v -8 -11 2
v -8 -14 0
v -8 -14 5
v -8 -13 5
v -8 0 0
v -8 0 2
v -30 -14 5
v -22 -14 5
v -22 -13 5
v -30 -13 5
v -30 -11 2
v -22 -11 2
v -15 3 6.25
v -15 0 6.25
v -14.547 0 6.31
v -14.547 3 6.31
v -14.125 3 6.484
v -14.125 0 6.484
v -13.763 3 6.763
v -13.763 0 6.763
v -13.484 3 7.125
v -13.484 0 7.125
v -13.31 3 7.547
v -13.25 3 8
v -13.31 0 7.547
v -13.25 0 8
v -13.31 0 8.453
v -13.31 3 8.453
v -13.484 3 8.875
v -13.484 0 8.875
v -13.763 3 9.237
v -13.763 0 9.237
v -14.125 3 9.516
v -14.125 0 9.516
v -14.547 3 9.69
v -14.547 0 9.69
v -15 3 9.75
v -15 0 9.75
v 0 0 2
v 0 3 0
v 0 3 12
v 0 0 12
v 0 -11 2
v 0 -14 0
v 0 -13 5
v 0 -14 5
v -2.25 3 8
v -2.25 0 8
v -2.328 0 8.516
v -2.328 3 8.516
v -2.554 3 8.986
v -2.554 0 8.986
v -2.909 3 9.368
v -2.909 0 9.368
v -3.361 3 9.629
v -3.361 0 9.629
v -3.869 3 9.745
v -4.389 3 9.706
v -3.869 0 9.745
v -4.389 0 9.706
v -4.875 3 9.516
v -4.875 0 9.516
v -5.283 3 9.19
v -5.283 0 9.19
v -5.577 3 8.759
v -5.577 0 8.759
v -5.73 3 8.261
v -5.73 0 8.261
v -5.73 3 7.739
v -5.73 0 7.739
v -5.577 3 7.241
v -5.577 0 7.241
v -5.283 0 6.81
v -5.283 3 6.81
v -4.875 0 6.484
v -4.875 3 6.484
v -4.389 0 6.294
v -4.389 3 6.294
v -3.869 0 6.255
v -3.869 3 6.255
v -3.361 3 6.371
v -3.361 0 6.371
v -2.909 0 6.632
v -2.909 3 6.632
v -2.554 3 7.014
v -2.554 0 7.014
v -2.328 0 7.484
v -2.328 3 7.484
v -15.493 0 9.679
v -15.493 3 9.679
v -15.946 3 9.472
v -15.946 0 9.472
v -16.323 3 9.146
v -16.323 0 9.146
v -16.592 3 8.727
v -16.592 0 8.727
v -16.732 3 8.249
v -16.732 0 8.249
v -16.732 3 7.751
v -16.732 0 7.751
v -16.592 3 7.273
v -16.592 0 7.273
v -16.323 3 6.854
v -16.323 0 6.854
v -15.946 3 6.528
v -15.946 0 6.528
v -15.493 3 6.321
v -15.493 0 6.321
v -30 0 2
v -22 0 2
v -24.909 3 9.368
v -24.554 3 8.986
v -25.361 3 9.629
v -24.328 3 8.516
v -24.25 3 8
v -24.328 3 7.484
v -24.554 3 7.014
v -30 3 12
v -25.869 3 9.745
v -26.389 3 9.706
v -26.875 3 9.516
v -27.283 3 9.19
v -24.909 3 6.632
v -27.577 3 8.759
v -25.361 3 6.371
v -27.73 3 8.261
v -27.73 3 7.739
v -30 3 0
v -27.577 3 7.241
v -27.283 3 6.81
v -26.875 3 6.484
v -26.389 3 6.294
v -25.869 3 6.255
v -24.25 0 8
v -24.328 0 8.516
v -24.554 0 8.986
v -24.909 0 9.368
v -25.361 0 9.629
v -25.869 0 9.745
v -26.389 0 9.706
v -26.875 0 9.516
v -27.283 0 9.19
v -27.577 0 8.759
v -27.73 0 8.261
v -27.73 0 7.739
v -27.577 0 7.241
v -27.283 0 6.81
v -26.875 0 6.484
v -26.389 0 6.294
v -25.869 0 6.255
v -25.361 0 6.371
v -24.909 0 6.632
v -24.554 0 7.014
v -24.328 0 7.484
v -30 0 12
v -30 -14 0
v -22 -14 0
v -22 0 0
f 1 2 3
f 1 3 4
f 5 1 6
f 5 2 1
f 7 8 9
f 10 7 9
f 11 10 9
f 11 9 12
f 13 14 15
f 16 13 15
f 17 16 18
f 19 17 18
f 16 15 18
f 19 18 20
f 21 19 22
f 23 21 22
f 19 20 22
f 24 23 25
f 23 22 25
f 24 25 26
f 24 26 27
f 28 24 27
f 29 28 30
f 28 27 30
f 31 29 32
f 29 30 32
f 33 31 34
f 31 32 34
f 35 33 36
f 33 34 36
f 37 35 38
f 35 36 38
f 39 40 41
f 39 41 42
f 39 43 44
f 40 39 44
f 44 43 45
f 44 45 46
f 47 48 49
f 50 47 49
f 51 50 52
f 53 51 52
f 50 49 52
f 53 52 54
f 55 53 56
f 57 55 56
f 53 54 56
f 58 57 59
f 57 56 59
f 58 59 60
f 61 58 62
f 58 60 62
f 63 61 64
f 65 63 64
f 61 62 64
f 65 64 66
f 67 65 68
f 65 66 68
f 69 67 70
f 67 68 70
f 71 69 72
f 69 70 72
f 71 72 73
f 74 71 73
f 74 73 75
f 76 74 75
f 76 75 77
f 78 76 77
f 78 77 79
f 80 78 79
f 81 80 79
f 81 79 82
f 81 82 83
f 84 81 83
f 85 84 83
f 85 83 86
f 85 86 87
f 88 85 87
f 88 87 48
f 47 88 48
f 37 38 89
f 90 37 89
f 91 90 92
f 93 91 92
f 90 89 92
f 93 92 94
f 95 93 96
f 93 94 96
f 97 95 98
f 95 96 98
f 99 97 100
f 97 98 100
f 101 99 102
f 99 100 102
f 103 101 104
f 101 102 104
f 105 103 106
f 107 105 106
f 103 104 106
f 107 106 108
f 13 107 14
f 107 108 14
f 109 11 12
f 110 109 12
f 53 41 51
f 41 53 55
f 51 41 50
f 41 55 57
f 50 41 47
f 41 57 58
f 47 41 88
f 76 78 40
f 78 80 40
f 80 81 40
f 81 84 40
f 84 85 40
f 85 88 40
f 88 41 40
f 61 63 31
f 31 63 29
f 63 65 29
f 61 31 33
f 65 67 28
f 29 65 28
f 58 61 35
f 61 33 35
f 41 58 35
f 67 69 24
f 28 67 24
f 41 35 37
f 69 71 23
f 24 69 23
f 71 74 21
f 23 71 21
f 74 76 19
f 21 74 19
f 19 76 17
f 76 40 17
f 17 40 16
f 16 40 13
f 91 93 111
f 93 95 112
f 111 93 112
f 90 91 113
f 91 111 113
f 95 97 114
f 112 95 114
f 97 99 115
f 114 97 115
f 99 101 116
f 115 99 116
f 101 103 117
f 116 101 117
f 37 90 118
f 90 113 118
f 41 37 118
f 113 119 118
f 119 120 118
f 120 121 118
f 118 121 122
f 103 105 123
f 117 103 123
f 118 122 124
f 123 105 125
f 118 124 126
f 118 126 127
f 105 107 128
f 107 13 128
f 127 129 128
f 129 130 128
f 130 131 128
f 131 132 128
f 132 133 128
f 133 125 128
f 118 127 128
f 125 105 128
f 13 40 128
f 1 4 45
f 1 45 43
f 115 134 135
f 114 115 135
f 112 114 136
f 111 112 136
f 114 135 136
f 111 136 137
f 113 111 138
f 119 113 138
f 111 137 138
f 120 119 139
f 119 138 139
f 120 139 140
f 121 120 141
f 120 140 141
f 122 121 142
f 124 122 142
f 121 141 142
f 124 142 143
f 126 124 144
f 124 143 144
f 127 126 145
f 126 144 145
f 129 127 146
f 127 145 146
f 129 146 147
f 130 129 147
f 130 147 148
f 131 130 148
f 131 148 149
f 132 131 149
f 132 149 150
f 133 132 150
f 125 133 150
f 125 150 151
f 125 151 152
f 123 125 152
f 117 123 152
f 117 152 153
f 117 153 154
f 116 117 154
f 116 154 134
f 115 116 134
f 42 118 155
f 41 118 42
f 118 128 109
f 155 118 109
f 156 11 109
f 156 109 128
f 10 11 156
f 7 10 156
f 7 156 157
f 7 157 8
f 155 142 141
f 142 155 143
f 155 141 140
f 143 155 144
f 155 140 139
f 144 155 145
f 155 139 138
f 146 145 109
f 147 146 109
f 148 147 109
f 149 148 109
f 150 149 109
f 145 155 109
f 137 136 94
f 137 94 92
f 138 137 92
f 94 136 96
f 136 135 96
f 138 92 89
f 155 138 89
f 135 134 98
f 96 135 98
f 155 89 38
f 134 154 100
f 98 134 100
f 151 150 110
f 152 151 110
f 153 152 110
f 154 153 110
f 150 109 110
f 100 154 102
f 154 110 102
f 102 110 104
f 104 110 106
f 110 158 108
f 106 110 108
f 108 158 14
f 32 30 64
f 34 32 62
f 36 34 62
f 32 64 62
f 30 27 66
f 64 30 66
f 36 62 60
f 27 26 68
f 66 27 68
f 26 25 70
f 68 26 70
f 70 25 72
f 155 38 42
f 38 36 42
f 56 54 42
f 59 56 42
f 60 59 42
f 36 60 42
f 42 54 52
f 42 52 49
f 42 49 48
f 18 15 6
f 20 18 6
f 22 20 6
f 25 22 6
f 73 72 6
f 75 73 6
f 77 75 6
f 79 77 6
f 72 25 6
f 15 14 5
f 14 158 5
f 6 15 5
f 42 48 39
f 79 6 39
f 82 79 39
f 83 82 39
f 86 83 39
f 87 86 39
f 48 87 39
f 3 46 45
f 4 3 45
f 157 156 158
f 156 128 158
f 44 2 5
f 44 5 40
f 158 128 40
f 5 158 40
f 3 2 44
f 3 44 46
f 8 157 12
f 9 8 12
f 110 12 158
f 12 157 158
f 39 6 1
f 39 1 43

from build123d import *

# Parameters (mm, degrees)
F0_W     = 8
F0_H     = 14
F1_DEPTH = 2
F3_DEPTH = 10
F4_R     = 1.75
F5_DEPTH = 25
F7_DEPTH = 30
F8_W     = 14
F8_H     = 3
F9_DEPTH = 25


with BuildPart() as f1:
    # F0 (on Top) → F1 (new body)
    with BuildSketch(Plane.XY):
        with Locations((-26, -7)):
            Rectangle(F0_W, F0_H)
        Polygon((-22, 0), (-15, 0), (-15, 3), (-30, 3), (-30, 0), align=None)
        Polygon((-8, 0), (0, 0), (0, 3), (-15, 3), (-15, 0), align=None)
        with Locations((-4, -7)):
            Rectangle(F0_W, F0_H)
    extrude(amount=F1_DEPTH)

    # F2 (on face) → F3 (join)
    with BuildSketch(Plane.XY.offset(2)):
        Polygon((0, 3), (-30, 3), (-30, 0), (-22, 0), (-8, 0), (0, 0), align=None)
    extrude(amount=F3_DEPTH)

    # F4 (on face) → F5 (cut)
    with BuildSketch(Plane.XZ):
        with Locations((-26, 8)):
            Circle(F4_R)
        with BuildLine():
            Line((-15, 6.25), (-15, 9.75))
            ThreePointArc((-15, 9.75), (-16.75, 8), (-15, 6.25))
        make_face()
        with BuildLine():
            ThreePointArc((-13.25, 8), (-13.7625631329, 9.2374368671), (-15, 9.75))
            Line((-15, 9.75), (-15, 6.25))
            ThreePointArc((-15, 6.25), (-13.7625631329, 6.7625631329), (-13.25, 8))
        make_face()
        with Locations((-4, 8)):
            Circle(F4_R)
    extrude(amount=-F5_DEPTH, mode=Mode.SUBTRACT)

    # F6 (on face) → F7 (join)
    with BuildSketch(Plane(origin=(-30, 0, 0), x_dir=(0, -1, 0), z_dir=(-1, 0, 0))):
        Polygon((11, 2), (14, 2), (14, 5), (13, 5), align=None)
    extrude(amount=-F7_DEPTH)

    # F8 (on face) → F9 (cut)
    with BuildSketch(Plane(origin=(0, 0, 2), x_dir=(1, 0, 0), z_dir=(0, 0, -1))):
        with Locations((-15, 12.5)):
            Rectangle(F8_W, F8_H)
    extrude(amount=-F9_DEPTH, mode=Mode.SUBTRACT)


solid = f1.part
